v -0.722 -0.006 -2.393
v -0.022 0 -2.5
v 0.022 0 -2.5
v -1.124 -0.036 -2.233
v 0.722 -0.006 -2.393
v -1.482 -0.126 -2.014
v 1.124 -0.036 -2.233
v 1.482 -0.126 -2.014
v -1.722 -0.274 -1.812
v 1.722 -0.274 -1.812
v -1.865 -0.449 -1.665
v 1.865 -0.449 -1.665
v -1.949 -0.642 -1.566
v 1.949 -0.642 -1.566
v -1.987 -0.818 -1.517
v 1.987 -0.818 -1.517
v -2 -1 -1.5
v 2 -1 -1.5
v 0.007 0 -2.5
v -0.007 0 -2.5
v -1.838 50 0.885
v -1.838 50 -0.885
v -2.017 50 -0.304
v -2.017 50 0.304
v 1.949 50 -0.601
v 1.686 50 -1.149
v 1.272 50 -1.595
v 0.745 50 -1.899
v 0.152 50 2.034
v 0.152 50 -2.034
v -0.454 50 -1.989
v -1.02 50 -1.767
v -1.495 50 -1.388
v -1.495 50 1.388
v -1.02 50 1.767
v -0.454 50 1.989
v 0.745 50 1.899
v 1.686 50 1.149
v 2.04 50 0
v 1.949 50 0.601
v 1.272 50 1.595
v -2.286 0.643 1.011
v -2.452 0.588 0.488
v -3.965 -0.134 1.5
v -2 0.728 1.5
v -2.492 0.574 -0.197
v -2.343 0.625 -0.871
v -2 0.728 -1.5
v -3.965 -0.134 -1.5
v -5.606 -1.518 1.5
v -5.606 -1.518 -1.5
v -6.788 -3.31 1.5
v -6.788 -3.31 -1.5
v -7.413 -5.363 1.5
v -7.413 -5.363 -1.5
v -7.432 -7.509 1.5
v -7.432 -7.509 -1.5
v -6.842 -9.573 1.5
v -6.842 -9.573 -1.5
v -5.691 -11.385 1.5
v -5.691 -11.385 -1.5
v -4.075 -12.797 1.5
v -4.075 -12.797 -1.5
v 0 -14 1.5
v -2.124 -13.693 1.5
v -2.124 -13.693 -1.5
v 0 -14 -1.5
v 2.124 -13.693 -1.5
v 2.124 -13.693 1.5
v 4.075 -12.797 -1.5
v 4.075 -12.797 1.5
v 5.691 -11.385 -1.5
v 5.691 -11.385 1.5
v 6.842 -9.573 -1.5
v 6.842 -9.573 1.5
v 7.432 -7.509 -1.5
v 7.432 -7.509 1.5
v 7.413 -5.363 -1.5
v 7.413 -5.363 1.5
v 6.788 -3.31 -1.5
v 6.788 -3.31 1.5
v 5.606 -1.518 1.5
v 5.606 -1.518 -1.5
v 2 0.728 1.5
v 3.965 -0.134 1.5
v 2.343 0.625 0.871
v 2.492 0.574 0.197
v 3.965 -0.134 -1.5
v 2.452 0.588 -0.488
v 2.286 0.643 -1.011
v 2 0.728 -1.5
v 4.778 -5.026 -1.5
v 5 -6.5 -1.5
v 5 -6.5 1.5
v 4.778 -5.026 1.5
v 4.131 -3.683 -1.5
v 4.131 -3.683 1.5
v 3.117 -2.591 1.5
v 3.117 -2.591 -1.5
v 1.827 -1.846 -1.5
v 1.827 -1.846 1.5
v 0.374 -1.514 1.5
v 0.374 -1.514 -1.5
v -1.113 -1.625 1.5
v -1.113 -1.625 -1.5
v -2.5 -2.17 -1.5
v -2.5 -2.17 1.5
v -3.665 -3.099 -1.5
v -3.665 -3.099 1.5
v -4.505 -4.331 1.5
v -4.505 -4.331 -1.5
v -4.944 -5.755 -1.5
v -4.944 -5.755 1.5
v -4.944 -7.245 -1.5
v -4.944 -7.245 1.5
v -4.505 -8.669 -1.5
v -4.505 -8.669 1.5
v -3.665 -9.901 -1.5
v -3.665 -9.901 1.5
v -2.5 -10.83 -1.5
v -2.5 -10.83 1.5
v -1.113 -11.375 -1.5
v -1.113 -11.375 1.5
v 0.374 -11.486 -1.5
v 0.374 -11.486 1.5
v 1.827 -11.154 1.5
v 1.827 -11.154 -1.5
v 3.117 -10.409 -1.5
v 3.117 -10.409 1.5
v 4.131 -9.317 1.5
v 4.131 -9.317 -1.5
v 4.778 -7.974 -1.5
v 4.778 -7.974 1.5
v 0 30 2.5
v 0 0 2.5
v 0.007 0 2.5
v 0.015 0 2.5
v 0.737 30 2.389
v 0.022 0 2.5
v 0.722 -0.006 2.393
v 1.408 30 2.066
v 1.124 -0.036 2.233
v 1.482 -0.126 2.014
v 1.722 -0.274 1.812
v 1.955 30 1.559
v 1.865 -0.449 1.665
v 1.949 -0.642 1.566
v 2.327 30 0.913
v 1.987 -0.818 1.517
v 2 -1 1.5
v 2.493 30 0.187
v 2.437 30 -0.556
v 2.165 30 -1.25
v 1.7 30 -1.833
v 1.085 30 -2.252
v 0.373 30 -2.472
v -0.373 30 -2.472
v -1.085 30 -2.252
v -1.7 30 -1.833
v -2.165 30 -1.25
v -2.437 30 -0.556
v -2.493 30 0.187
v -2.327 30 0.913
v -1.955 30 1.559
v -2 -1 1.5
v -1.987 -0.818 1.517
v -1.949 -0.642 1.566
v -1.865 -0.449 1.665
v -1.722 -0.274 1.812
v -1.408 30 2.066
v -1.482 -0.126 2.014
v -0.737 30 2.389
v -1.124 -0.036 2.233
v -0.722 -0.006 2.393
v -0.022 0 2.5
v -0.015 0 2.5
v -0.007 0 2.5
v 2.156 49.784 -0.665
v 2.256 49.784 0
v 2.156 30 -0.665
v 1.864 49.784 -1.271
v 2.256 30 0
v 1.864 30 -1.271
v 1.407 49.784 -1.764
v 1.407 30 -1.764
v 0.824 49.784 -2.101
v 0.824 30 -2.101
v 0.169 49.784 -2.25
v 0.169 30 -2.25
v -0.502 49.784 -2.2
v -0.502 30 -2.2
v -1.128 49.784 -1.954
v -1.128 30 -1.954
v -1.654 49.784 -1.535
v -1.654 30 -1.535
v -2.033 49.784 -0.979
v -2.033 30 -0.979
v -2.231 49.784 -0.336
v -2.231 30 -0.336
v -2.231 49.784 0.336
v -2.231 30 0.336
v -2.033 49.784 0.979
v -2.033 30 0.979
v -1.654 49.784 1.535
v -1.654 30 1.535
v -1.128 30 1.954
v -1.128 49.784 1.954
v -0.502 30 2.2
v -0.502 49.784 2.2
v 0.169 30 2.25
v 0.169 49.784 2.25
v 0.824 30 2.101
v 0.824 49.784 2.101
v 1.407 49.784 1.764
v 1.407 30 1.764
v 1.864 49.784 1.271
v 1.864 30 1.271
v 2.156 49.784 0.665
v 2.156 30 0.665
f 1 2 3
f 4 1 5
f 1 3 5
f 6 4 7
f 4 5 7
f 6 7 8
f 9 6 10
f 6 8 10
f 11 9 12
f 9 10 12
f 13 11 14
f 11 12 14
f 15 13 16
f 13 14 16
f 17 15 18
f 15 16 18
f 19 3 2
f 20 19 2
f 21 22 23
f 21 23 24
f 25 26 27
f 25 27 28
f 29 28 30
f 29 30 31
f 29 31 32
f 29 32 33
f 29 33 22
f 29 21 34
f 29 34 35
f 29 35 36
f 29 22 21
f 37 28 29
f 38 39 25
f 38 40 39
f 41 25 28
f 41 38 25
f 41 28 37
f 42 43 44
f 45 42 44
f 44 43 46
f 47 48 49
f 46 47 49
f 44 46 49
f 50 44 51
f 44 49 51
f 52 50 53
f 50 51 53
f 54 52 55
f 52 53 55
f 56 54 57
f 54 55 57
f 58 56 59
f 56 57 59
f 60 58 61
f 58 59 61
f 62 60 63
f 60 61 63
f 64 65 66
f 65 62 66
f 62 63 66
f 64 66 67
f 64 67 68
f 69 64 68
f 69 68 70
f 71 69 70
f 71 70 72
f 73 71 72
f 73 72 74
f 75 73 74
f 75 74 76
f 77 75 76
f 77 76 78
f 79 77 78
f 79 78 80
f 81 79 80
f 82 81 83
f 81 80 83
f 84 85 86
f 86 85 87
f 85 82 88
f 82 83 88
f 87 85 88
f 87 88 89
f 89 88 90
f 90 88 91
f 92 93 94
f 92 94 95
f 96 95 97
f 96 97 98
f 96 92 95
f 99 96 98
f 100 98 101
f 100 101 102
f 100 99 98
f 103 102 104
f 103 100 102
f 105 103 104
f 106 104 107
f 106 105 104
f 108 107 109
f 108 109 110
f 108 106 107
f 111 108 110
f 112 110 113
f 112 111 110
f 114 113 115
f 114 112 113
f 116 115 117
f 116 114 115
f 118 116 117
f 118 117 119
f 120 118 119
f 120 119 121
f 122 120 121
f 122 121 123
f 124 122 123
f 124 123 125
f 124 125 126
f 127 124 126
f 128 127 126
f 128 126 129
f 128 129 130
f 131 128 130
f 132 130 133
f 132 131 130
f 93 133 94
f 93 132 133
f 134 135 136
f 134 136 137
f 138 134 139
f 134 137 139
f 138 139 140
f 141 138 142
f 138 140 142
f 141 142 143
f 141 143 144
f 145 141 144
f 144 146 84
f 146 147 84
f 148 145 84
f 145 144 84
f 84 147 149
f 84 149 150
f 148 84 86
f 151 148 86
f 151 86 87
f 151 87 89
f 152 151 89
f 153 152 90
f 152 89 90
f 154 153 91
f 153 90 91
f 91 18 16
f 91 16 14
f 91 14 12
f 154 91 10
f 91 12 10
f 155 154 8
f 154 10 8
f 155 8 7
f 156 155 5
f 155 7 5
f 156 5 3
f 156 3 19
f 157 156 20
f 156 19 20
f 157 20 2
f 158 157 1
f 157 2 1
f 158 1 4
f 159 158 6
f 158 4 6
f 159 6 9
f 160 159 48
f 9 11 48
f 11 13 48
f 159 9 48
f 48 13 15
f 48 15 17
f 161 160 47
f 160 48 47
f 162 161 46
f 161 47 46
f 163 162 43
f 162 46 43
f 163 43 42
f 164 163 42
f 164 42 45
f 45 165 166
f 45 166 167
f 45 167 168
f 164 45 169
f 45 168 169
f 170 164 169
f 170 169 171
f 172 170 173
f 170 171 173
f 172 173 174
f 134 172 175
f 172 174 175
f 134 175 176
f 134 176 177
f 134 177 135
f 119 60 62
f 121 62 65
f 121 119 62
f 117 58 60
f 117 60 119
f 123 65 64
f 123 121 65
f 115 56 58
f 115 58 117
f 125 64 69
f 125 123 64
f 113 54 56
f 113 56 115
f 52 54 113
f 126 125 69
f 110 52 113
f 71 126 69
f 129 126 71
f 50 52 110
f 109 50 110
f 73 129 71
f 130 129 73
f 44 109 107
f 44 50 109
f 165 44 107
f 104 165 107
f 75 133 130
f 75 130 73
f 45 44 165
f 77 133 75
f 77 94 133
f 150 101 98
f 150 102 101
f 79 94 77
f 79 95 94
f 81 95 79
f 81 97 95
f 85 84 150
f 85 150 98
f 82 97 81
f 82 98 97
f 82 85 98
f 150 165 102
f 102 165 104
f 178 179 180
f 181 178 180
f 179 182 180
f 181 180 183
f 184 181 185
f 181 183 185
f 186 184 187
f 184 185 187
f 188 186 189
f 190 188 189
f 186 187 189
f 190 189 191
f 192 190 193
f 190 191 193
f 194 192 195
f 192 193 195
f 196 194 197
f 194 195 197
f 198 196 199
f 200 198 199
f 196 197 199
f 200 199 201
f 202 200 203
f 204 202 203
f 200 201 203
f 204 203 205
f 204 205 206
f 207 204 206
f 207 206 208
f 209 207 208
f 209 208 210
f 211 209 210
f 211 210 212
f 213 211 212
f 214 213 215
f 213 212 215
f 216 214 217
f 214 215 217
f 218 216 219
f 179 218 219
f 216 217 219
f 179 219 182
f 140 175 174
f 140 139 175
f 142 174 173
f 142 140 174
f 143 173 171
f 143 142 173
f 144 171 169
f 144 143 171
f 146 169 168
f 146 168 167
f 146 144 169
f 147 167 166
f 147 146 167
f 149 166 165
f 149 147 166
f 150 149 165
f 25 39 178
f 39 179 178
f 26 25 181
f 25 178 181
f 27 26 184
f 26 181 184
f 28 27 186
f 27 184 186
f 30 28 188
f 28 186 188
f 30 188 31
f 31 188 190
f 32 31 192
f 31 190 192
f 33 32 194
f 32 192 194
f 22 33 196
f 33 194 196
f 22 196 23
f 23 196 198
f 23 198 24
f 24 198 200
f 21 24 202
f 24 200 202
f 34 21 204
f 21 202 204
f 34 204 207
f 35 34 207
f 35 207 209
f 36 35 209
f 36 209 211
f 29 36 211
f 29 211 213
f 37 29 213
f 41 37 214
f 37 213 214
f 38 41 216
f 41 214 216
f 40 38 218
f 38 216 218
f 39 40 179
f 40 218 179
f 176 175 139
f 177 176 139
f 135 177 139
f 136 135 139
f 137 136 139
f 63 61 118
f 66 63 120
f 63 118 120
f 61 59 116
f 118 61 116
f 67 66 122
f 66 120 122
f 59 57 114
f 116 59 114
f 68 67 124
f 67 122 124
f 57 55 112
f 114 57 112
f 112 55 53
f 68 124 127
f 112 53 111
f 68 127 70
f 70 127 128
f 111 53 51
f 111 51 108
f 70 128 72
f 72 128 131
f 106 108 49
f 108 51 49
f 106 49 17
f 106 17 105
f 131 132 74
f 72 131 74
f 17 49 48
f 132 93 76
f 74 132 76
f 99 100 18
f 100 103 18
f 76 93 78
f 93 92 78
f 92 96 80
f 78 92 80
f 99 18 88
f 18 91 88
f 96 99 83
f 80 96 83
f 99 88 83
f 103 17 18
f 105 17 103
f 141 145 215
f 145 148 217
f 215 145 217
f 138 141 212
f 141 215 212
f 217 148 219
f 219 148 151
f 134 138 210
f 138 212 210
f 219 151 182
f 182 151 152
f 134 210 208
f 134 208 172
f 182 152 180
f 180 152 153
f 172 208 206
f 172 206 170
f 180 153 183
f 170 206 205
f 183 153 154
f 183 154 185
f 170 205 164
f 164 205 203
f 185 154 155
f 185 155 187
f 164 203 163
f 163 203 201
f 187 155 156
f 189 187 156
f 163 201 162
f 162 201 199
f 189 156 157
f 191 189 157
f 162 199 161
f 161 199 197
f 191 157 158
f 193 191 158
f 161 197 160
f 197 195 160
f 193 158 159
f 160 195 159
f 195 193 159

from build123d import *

# Parameters (mm, degrees)
SKETCH1_R                = 2.5
BOSS_EXTRUDE1_DEPTH      = 50
BOSS_EXTRUDE2_DEPTH      = 1.5
BOSS_EXTRUDE2_DEPTH_BACK = 1.5
SKETCH2_R                = 7.5
SKETCH2_R_2              = 5
FILLET1_R                = 1
FILLET2_R                = 1


# Read off the part's stored shape, not the designer's step: M5x0.75 Machine Threads Stud1
with BuildPart() as part:
    # Sketch1 → Boss-Extrude1 (new body)
    with BuildSketch(Plane(origin=(0, 0, 0), x_dir=(1, 0, 0), z_dir=(0, 1, 0))):
        with Locations(Location((0, 0, 0), (0, 0, 270))):
            Circle(SKETCH1_R)
    extrude(amount=BOSS_EXTRUDE1_DEPTH)

    # Sketch2 → Boss-Extrude2 (add, two sides: drawn at the far end of the back side and taken through both)
    with BuildSketch(Plane.XY.offset(-BOSS_EXTRUDE2_DEPTH_BACK)):
        with Locations((0, -6.5)):
            Circle(SKETCH2_R)
        with Locations((0, -6.5)):
            Circle(SKETCH2_R_2, mode=Mode.SUBTRACT)
    extrude(amount=BOSS_EXTRUDE2_DEPTH + BOSS_EXTRUDE2_DEPTH_BACK)

    # Fillet1
    fillet1_edges = [part.edges().sort_by_distance(p)[0] for p in [
        (0, 0, -1.5),
    ]]
    fillet(fillet1_edges, radius=FILLET1_R - 0.0001)  # a hair under: the kernel refuses the full size

    # Fillet2
    fillet2_edges = [part.edges().sort_by_distance(p)[0] for p in [
        (0, 0, 1.5),
    ]]
    fillet(fillet2_edges, radius=FILLET2_R - 0.0001)  # a hair under: the kernel refuses the full size

    # M5x0.75 Machine Threads Stud1 outline → M5x0.75 Machine Threads Stud1 (revolve, cut)
    with BuildSketch(Plane.XY):
        Polygon((2.5, 50), (2.04, 50), (2.2565, 49.7835), (2.2565, 30), (2.5, 30), align=None)
    revolve(axis=Axis((0, 0, 0), (0, 1, 0)), mode=Mode.SUBTRACT)


solid = part.part
